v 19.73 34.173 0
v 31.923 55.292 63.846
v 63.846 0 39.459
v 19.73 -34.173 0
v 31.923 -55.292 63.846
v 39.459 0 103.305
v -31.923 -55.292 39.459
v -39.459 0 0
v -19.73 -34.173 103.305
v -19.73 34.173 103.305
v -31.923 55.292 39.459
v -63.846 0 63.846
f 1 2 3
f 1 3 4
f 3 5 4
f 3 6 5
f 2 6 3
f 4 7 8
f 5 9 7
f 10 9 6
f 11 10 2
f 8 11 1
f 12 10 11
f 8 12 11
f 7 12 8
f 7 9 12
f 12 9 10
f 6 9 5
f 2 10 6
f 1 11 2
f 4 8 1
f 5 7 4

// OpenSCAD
// file: dodecatron.scad
include <numbers.scad>
use <functions.scad>
use <splitting.scad>

// Four rings of five, dodecahedral points.
A = [for (r = rotate5) canonv(r * [0, gold-1, gold])];
B = [for (r = rotate5) canonv(r * [-1, 1, 1])];
C = -B;
D = -A;

// Icosohedral points.
I0 = [1, 0, gold];
IA = [for (r = rotate5) canonv(r * [-1, 0, gold])];
IB = -IA;
I1 = -I0;

module dodecahedron() scale(1 / sqrt(3)) twelve() pyramid(A);

module final_dual()
    scale(1/sqrt(3)) pyramids(canonvvv(sixty([A[0], C[4], C[1]])));

// Generate the region of the final_dual() that is bounded by all the faces.
module final_dual_peanut() scale(1/sqrt(3))
        intersection_for (f = sixty([B[0], B[2], C[1]]))
        pyramid(f, -sum(f));

module great_stellated_dodecahedron()
    scale(1 / sqrt(3)) twelve() star_pyramid(B);

module great_dodecahedron()
    scale(1 / norm(I0)) for (f = twelve(IA)) pyramid(f);

module small_stellated_dodecahedron()
    scale(1 / norm(I0)) twelve() star_pyramid(IA);

module five_cubes() {
    cc = ["#8cf", "lightgreen", "yellow", "red", "orange"];
    for (i = [0:4])
        multmatrix(rotate5[i]) color(cc[i]) cube(2 / sqrt(3), center=true);
}

module dual_c28() scale(1 / sqrt(3)) {
    // Great isogonal icosidodecahedron.
    pyramids(canonvvv(twenty(hexagon(A[3], A[4]))));
    color("lightgreen") pyramids(twelve(B));
}

module stella_octangular() scale(1 / sqrt(3)) {
    pyramids(four(triangle([1,1,-1])));
    color("green") pyramids(four(triangle([-1,-1,1])));
}

module stella_octangular_eighth() {
    scl = $radius / sqrt(3);
    joiners=[
        [[-2.5, -6], [-4.5, 8]],
        ];
    trapezohedron(triangle([scl, 0, 0]), [scl,scl,scl], $radius*0.2,
                  joiners=joiners);
}

color20 = "#5cf";                        // Light blue.
color12 = "gold";
color12b = "lightgreen";

module dodecadodecahedron() scale(0.5 / gold) {
    twelve() star_pyramid(cycle(A) + A);
    twelve() pyramid(A + B, topcolor=color12b);
}

module dodecadodecahedron_pieces() {
    scl = $radius / 2 / gold;
    P = scl * (A + cycle(A));
    Q = (gold - 1) * P + (2 - gold) * cycle(P, 2);
    star = [for (i = [0:4]) each [P[i], Q[i]]];

    joiners = [[[-10, 0]]];
    if ($piece == 1)
        translate([0, 0, norm(sum(P)/5)]) scale($radius) pointup()
            dodecadodecahedron();

    if ($piece == 2)
        trapezohedron(star, sum(P) / 5, $radius * 0.71,
                      joiners=joiners, span=2);

    if ($piece == 3)
        trapezohedron(hexagon(P[0], mns(Q[0])),
                      $radius * (2 - gold) * [1,1,1],
                      $radius * (2 - gold) * sqrt(3) - 1,
                      joiners=joiners, span=2);
}

module great_ditrigonal_icosidodecahedron() scale(1 / sqrt(3)) {
    twelve() pyramid(B, topcolor=color12);
    pyramids(canonvvv(twenty([A[2], A[0], B[1]])), topcolor=color20);
}

module small_ditrigonal_icosidodecahedron() scale(1 / sqrt(3)) {
    echo("SDI pentagram", norm(A[0] - A[2]) / norm(A[0]));
    // Dual to Small triambic icosahedron.
    twelve() star_pyramid(A, topcolor=color12);
    pyramids(canonvvv(twenty([A[2], A[0], B[1]])), topcolor=color20);
}

module small_ditrigonal_icosidodecahedron_piece() {
    scl = $radius / sqrt(3);
    P = (gold - 1) * A + (2 - gold) * cycle(A, 2);
    star = scl * [for (i = [0:4]) each [A[i], P[i]]];
    wedge = scl * [A[0], mns(P[1]), A[1], P[0]];
    wedge_c = (wedge[1] + wedge[3]) / 2;
    joiner = [[[-5.3,0]]];
    if ($piece == 2)
        trapezohedron(star, sum(star)/len(star),
                      $radius * inscribe - 7, joiners=joiner, span=2);

    else if ($piece == 3)
        trapezohedron(wedge, wedge_c, $radius * 0.75, joiners=joiner, span=2);
}

module ditrigonal_dodecadodecahedron() scale(1 / sqrt(3)) {
    // Dual to the Medial triambic icosahedron.  As this is a
    // dodecadodecahedron, lets use a different second color!
    twelve() star_pyramid(A, a=sum(A)/5 * (7 - 4 * gold), topcolor=color12,
                          undercolor=color12b);
    twelve() star_pyramid(B, topcolor=color12b);
}

//stella_octangular_eighth();
//five_cubes();
//dodecadodecahedron();
//small_ditrigonal_icosidodecahedron();
//ditrigonal_dodecadodecahedron();
//great_ditrigonal_icosidodecahedron();
//flushtruncated_great_icosahedron();
//dual_c28();

//function one(x) = [x];
//pyramids(sixty([A[0], A[2], D[1]]));

module flushtruncated_great_icosahedron() scale(1 / sqrt(3)) {
    twelve() star_pyramid(A);
    color("lightgreen") pyramids(twenty(hexagon(A[3], A[4])));
}
// file: numbers.scad
// The number we all love.
gold = (1 + sqrt(5)) / 2;

// Ratio of inner over outer circumscribed radii of the icosahedron.  The
// dodecahedron has the same ratio!
inscribe = sqrt(1/3 + 2/15 * sqrt(5));
// Ratio of face radius to icosahedron radius.
coscribe = sqrt(2/3 - 2/15 * sqrt(5));
// Ratio of dodecahedral mid-edge to vertex radii.  (This is the cosine of half
// the dihedral angle).
dodeca_midscribe = sqrt(1/2 + sqrt(5) / 6);
dodeca_comidscribe = sqrt(1/2 - sqrt(5) / 6);
// Ratio of icosahedral mid-edge to vertex radii.  (This is the cosine of half
// the dihedral angle).
icosa_midscribe = sqrt(1/2 + sqrt(5) / 10);
icosa_comidscribe = sqrt(1/2 - sqrt(5) / 10);

// Relative radii of the icosohedral stellation points.
raw_radius1 = 1;
raw_radius2 = (6 * gold - 3) / 5 * inscribe; // 1.0661408512011674
raw_radius3 = gold * icosa_midscribe;        // 1.3763819204711734
raw_radius4 = sqrt((17 - 4 * gold) / 5);     // 1.451059202444919
raw_radius5 = sqrt(21 + 28 * gold) / 5;      // 1.6285570507046667
raw_radius6 = 3 * inscribe;                  // 2.3839634168752983
raw_radius7 = 1 + 2 * gold;                  // 4.23607
raw_radius8 = sqrt(97 / 5 + 156 / 5 * gold); // 8.359584944780256
assert(abs(raw_radius5 - 1.6285570507046667) < 1e-7);
assert(abs(raw_radius8 - 8.359584944780256) < 1e-7);

// Radius of icosahedron with the vertex definitions we use.
ico_scale = sqrt(2 + gold);
// Actual radii in openscad units of the icosahedral stellation points.
radius1 = ico_scale;
radius2 = raw_radius2 * ico_scale;
radius3 = raw_radius3 * ico_scale;
radius4 = raw_radius4 * ico_scale;
radius5 = raw_radius5 * ico_scale;
radius6 = raw_radius6 * ico_scale;
radius7 = raw_radius7 * ico_scale;
radius8 = raw_radius8 * ico_scale;

identity = [[1,0,0],[0,1,0],[0,0,1]];

// Clockwise around [1,0,gold].
rot5 = [[1/2, gold/2, 1/2/gold],
        [-gold/2, 1/2/gold, 1/2],
        [1/2/gold, -1/2, gold/2]];

rot5_2 = rot5 * rot5;
rot5_3 = rot5_2 * rot5;
rot5_4 = rot5_2 * rot5_2;

rotate5 = [identity, rot5, rot5_2, rot5_3, rot5_4];
// main file
include <numbers.scad>
use <crennell.scad>
use <functions.scad>
use <dodecatron.scad>
use <splitting.scad>

// Crennell number of the object to print.
crennell = 1;
// Alternatively, you may replace `main();` below with the object you want.

// 0 = raw object, 1 = main printable, 2 = extra piece, 10 = stand.
$piece = 1;

// The overall radius in mm from the center of the piece to its extremities.
$radius = 65;
// Many of the dimensions below are scaled by the radius.

// When cutting into pieces, remove this much extra in the z direction (mm).
$extra_z_remove=0.001;
// This may be helpful where you have edges touching the base plate.

// Depth in mm of the hole for post joiners.
$join_depth=5;
// I use 10 for larger pieces, 5 for smaller ones where space is tight.

// Diameter in mm of the holes for post joiners.
$join_diameter=2.1;
// This should be the diameter of your filament (or whatever you use), plus a
// little.

// Diameter in mm of the stand posts.
$stand_diameter = 6;

// For stands and joiners.  (Gets multiplied for larger radii).
$fn=20;

main();

module main() {
    if (crennell == 1) {
        if ($piece == 0) c1();
        if ($piece == 1) icosa_tb_whole(radius1) c1();
        if ($piece == 4)
            translate([0, 0, $radius * inscribe]) rotate([180, 0, 0])
                three_twelfths(top=icosa_midscribe, cut=1/3,
                               mid=inscribe,
                               small=dodeca_midscribe/inscribe/3,
                               midsetz=-1.5, topset=3)
                c1();
        if ($piece == 5) one_twelfth(small=1/2,
                                     mid=radius1*inscribe,
                                     top=radius1*sqrt(inscribe)) c1();
        if ($piece == 6) two_twelfths() c1();
    }
    if (crennell == 2) c2();
    if (crennell == 3) {
        icosa_top_bottom(radius3, post=1/2) c3();
        if ($piece == 3) five_octahedron_twentieth();
        if ($piece == 10)
            stand_rhombus(x=2-gold, y=(3 - gold)/5) c3();
    }
    if (crennell == 4) c4();
    if (crennell == 5) c5();
    if (crennell == 6) {
        icosa_top_bottom(radius7, post=-1/3) c6();
        stand_tripod(height=inscribe, strut=-1/ico_scale/6, base=$radius/5) c6();
    }
    if (crennell == 7) {
        dodeca_spikey(post=0.1) c7();
        stand_pentapod(strut=-0.153) c7();
    }
    if (crennell == 8) {
        if ($piece == 0) c8();
        if ($piece == 1)
            two_twelfths(cut=0.09, // radius6/radius8 / gold / sqrt(3),
                         top=radius6/radius8 * dodeca_midscribe,
                         topset=2.25
                         ) c8();

        stand_tripod(strut=-0.2, hole=$radius/8) c8();
        stand_pentapod(strut=0.12, p=11) c8();
    }

    if (crennell == 9) c9();
    if (crennell == 10) c10();
    if (crennell == 11) c11();
    if (crennell == 12) c12();
    if (crennell == 13) dodeca_single() c13();
    if (crennell == 14) c14();
    if (crennell == 15) c15();
    if (crennell == 16) c16();
    if (crennell == 17) c17();
    if (crennell == 18) c18();
    if (crennell == 19) c19();
    if (crennell == 20) c20();
    if (crennell == 21) {
        if ($piece == 0)
            c21();
        if ($piece == 1) {
            difference() {
                intersection() {
                    scale($radius) c21();
                    scale($radius*1.1) translate([-1, -1, 0]) cube([2, 2, 1]);
                }
                r = $radius / sqrt(3) - 11;
                joiner_post(position=r*[1/gold,gold,0]);
                joiner_post(position=r*[-1/gold,gold,0]);
                joiner_post(position=r*[1/gold,-gold,0]);
                joiner_post(position=r*[-1/gold,-gold,0]);
            }
        }
    }
    if (crennell == 22) c22();
    if (crennell == 23) {
        icosa_top_bottom(radius7, post=-1/3, inset=5) c23();
        stand_tripod(height=inscribe,strut=-1/ico_scale/6, base=$radius/5) c23();
    }
    if (crennell == 24) c24();
    if (crennell == 25) c25();
    if (crennell == 26) {
        dodeca_single() c26();
        stand_tripod(strut=-coscribe/radius6) c26();
        // Piece 11 is a higher stand to match c23 when both have the same
        // size dodecahedron.
        stand_tripod(strut=-coscribe/radius6, length=1.2,
                     height=inscribe * radius7 / radius6, p=11) c26();
    }
    if (crennell == 27) {
        icosa_top_bottom(radius5, post=2/3, inset=5, angle=30) c27();
        if ($piece == 3) {
            one_twelfth(cut=1/2, top=radius3/radius5, topset=5,
                        mid=radius2/radius5) c27();
        }
        stand_tripod(strut=(gold - 1)/2) c27();
        stand_pentapod(strut=0.5 * inscribe, p=11) c27();
    }
    if (crennell == 28) {
        icosa_top_bottom(radius7, post=-1/3, inset=10) c28();
        if ($piece == 10)
            stand_quad(x=0.1, y=gold/10, height=gold/ico_scale) c28();
        stand_tripod(strut=gold-1.5, base=$radius/5, height=inscribe, p=11)
            c28();
        if ($piece == 12) {
            difference() {
                union() {
                    minkowski() {
                        cylinder(r1=3, r2=2.5, h=1, $fn=5);
                        intersection() {
                            sphere(1);
                            translate([-2,-2,0]) cube(4);
                        }
                    }
                    for (a = [-36,36,144,-144])
                        rotate(a) rotate([0,60,0]) translate([0,0,2])
                            rounded_ring(0, 0, height=3, r=1);
                            // dome() cylinder(r=0.5, h=2);
                }
                translate([0,0,10-$radius]) scale($radius) pointup() c16();
            }
        }
    }

    if (crennell == 29) c29();
    if (crennell == 30) {
        icosa_top_bottom(radius7, post=-radius4/radius7, inset=5) c30();
        stand_pentapod(strut=gold * 5 / 7 - 1, base=$radius/4, hole=2)
            c30();
    }
    if (crennell == 31) c31();
    if (crennell == 32) c32();
    if (crennell == 33) c33();
    if (crennell == 34) c34();
    if (crennell == 35) c35();
    if (crennell == 36) c36();
    if (crennell == 37) {
        dodeca_single() c37();
        // Default stand is low-profile.
        stand_tripod(strut=1/4, length=1/3, hole=2) c37();
        // Piece 11 matches the height of c23.
        stand_tripod(strut=1/4, length=2/3,
                     height=inscribe * radius7 / radius6, p=11) c37();
    }
    if (crennell == 38) c38();
    if (crennell == 39) c39();
    if (crennell == 40) c40();
    if (crennell == 41) c41();
    if (crennell == 42) c42();
    if (crennell == 43) c43();
    if (crennell == 44) c44();
    if (crennell == 45) c45();
    if (crennell == 46) {
        if ($piece == 0) c46();
        if ($piece == 1)
            one_twelfth(cut=1/3, mid=radius2/radius6, inset=3.5,
                        chamfer_edge=[0:4]) c46();
        stand_tripod(strut=-coscribe / raw_radius6, hole=2) c46();
    }
    if (crennell == 47) {
        icosa_top_bottom(radius6, post=0.5, inset=5) c47();
        p6a = [1 + gold, 0, -gold];
        stand_tripod(strut=-radius1/radius6*coscribe, hole=2) c47();
        if ($piece == 3)
            five_tetrahedron_twentieth();
        if ($piece == 11) {
            stand_tripod(strut=-radius1/radius6*coscribe, hole=2, p=11) c47();
            for (i = [0:4]) {
                translate($radius * [cos(i * 60), sin(i * 60), 0]) {
                    cylinder(h=$radius/4, r=$stand_diameter);
                    translate([0, 0, $radius/2]) faceup()
                        scale($radius/3/sqrt(3))
                        multmatrix(rotate5[(i + 3) * 2 % 5])
                        pyramids(four(invert(triangle([-1,1,1]))));
                }
            }
        }
    }
    if (crennell == 48) c48();
    if (crennell == 49) c49();
    if (crennell == 50) c50();
    if (crennell == 51) c51();
    if (crennell == 52) c52();
    if (crennell == 53) c53();
    if (crennell == 54) c54();
    if (crennell == 55) c55();
    if (crennell == 56) c56();
    if (crennell == 57) c57();
    if (crennell == 58) c58();
    if (crennell == 59) c59();

    // DUALS ETC.
    if (crennell == 101) {
        if ($piece == 0) dodecahedron();
        if ($piece == 1)
            scale($radius) translate([0,0,inscribe]) pointup() dodecahedron();
        if ($piece == 4)
            // This would actually work resting on a face.
            three_twelfths(cut=0.25, small=0.25, mid=1, midsetz=-5, inset=5)
                dodecahedron();
        if ($piece == 5)
            one_twelfth(cut=0.5, small=0.5, mid=1, midsetz=-5, inset=5)
                dodecahedron();
        if ($piece == 6)
            two_twelfths(cut=0.25, small=0.5, mid=1, midsetz=-5, inset=5)
                dodecahedron();
        stand_tripod(strut=-1/3, hole=$radius) dodecahedron();
    }
    if (crennell == 102) {
        if ($piece == 0) small_ditrigonal_icosidodecahedron();
        if ($piece == 1)
            scale($radius) translate([0,0,inscribe]) pointup()
                small_ditrigonal_icosidodecahedron();
        small_ditrigonal_icosidodecahedron_piece();
        if ($piece == 10)
            stand_quad(x=0.3047, y=0.3047, hole=1)
                small_ditrigonal_icosidodecahedron();
        if ($piece == 11)
            stand_tripod(strut=0.2845, hole=1, p=11)
                small_ditrigonal_icosidodecahedron();
    }
    if (crennell == 103) {
        five_cubes();
    }
    if (crennell == 107) {
        dodeca_spikey(post=0.3, inset=3, raise=(2 * gold - 3)*inscribe)
            great_stellated_dodecahedron();
        stand_tripod(strut=(0.6 - 0.2 * gold) * inscribe / sqrt(3), hole=2)
            great_stellated_dodecahedron();
    }
    if (crennell == 108) {
        icosa_top_bottom(radius6, post=0.4, inset=0*5) final_dual();
        if ($piece == 5)
            one_twelfth(cut=0.3, top=0.4, topset=0,
                        mid = $radius>=40 ? 1 : 0, midsetz=-36, inset=11)
                final_dual();
        if ($piece == 6)
            two_twelfths(cut=0.15, top=0.4, topset=0,
                         mid = $radius>=40 ? 1 : 0, midsetz=-36, inset=11)
                final_dual();
        if ($piece == 9) difference() {
                scale($radius) final_dual_peanut();
                translate([0,0,-$radius/2]) cube($radius, center=true);
                for (i = [0, 180]) joiner_post(i, [$radius / 15, 0, 0]);
            }
        stand_pentapod(strut=-0.21, strut_mm=$stand_diameter/2,
                       hole=$radius/5) final_dual();
        stand_pentapod(strut=(2-gold)*coscribe, strut_mm=$stand_diameter/2,
                       hole=$radius/5, p=11) final_dual();
        stand_tripod(strut=0.23, strut_mm=$stand_diameter/2,
                     length=2/3, hole=$radius/5, p=12) final_dual();
    }
    if (crennell == 128) {
        // Project [gold,1-gold,0] onto [1,1,1].
        p = [gold, 1-gold, 0];
        q = [1, 1, 1];
        icosa_top_bottom(norm(p)*norm(q),
                         post=0.767,//0.93,
                         inset=5, angle=30,
                         ref_radius=p * q) dual_c28();
        r1 = (2 - gold) * coscribe * $radius + $stand_diameter / 2 / cos(36);
        r2 = (1 - 2 * gold) / 5 * coscribe * $radius;
        stand_pentapod(strut=0, strut_mm=-max(r1, r2), hole=0) dual_c28();
    }
    // The 30th stellation can be taken to be either the medial- or the great-
    // triambic icosahedron, the duals of which are visibly different.  We
    // number the two as 130 and 230.
    if (crennell == 130) {
        ditrigonal_dodecadodecahedron();
    }
    if (crennell == 230) {
        great_ditrigonal_icosidodecahedron();
    }
    if (crennell == 200) {              // Out of place!
        if ($piece == 0) stella_octangular();
        if ($piece == 1) scale($radius) translate([0, 0, 1/sqrt(3)])
                             stella_octangular();
        if ($piece == 2) stella_octangular_eighth();
        if ($piece == 3) mirror([1, 0, 0]) stella_octangular_eighth();
    }
    if (crennell == 201) {
        dodeca_spikey(post=-2/sqrt(5), inset=15) great_dodecahedron();
        stand_pentapod(strut=(6 * gold - 8) / 5) great_dodecahedron();
    }
    if (crennell == 202) {
        dodeca_spikey(post=(gold-3)/5, inset=5) small_stellated_dodecahedron();
        stand_pentapod(strut=(gold-3)/5) small_stellated_dodecahedron();
    }
    if (crennell == 203) {
        if ($piece == 0)
            dodecadodecahedron();
        dodecadodecahedron_pieces();
        stand_tripod(strut=(gold - 2) * dodeca_midscribe, hole=1)
            dodecadodecahedron();
        stand_pentapod(strut=0.2, strut_mm = $stand_diameter/4, hole=1, p=11)
            dodecadodecahedron();
    }
}


// STANDS

// Create a tripod.  This implies that the object is face-up to get the 3-fold
// symmetry about the z-axis.
//
// `strut` is the distance from the z-axis to the support struts, as a fraction
// of radius.  `strut_mm` is the same in mm.  If both are non-zero then they
// are added together.
//
// `length` is the length of the strut, as fraction of radius.  Note that as
// the object is raised 2mm, we also increase the length by 2mm.
//
// `thick` is the radius of the struts.
//
// `base` is the base radius, if larger than the computed one.
//
// `hole` if non-zero is the radius of a circle to remove from the center of the
// base.
//
// `height` is the height of the center of the object, as a ratio of `radius`.
// 2mm is added to this.
module stand_tripod(strut, strut_mm=0, base=0,
                    length=1, height=1, align=[1, 0, 0], hole=0, p=10) {
    stand_generic(
        3, strut, strut_mm, base, length, height, hole, p)
        align_rot(align) faceup() children();
}

module stand_pentapod(strut, strut_mm=0, base=0,
                      length=1, height=1, hole=0, p=10) {
    stand_generic(
        5, strut, strut_mm, base, length, height, hole, p)
        pointup() children();
}

module stand_generic(num, strut, strut_mm=0, base=0,
                     length=1, height=1, hole=0, p=10) {
    if ($piece == p) {
        strut_all = strut * $radius + strut_mm;
        difference() {
            for (i = [1:num]) {
                rotate(i * 360 / num) translate([strut_all, 0, 0])
                    cylinder(r = $stand_diameter / 2, h=$radius * length + 2);
            }
            # translate([0, 0, $radius * height + 2])
                scale($radius) children();
        }
        stand_ring(base, hole, strut_all);
    }
}

module stand_quad(x, y, length=1, height=1, hole=0) {
    difference() {
        for (c = [[x, y], [-x, y], [-x, -y], [x, -y]])
            translate([c.x * $radius, c.y * $radius, 0])
                cylinder(r = $stand_diameter / 2, h=$radius * length + 2);
        #translate([0, 0, $radius * height + 2])
        scale($radius) children();
    }
    stand_ring(0, 1, norm([x, y]) * $radius);
}

module stand_rhombus(x, y, length=1, height=1) {
    difference() {
        for (c = [[x, 0], [-x, 0], [0, -y], [0, y]])
            translate([c.x * $radius, c.y * $radius, 0])
                cylinder(r = $stand_diameter / 2, h=$radius * length + 2);
        #translate([0, 0, $radius * height + 2])
        scale($radius) children();
    }
    stand_ring(max(x, y), min(x, y), x * $radius);
}

module stand_ring(base, hole, strut_mm) {
    outer = max(base * $radius, abs(strut_mm) + $stand_diameter / 2);
    inner = min(hole * $radius, abs(strut_mm) - $stand_diameter / 2);
    rounded_ring(outer, inner, n = $fn * 6);
}

module rounded_ring(outer, inner, height=0, r=2, n=0) {
    rotate_extrude($fn = n ? n : $fn) {
        translate([outer, height]) intersection() {
            circle(r);
            square(r);
        }
        if (inner >= r) translate([inner, height]) intersection() {
                circle(r);
                translate([-r, 0]) square(r);
            }
        if (outer > inner)
            translate([inner, 0]) square([outer - inner, height + r]);
        iinner = inner >= r ? inner - r : inner;
        if (height > 0)
            translate([inner, 0]) square([outer + r - iinner, height]);
    }
}
